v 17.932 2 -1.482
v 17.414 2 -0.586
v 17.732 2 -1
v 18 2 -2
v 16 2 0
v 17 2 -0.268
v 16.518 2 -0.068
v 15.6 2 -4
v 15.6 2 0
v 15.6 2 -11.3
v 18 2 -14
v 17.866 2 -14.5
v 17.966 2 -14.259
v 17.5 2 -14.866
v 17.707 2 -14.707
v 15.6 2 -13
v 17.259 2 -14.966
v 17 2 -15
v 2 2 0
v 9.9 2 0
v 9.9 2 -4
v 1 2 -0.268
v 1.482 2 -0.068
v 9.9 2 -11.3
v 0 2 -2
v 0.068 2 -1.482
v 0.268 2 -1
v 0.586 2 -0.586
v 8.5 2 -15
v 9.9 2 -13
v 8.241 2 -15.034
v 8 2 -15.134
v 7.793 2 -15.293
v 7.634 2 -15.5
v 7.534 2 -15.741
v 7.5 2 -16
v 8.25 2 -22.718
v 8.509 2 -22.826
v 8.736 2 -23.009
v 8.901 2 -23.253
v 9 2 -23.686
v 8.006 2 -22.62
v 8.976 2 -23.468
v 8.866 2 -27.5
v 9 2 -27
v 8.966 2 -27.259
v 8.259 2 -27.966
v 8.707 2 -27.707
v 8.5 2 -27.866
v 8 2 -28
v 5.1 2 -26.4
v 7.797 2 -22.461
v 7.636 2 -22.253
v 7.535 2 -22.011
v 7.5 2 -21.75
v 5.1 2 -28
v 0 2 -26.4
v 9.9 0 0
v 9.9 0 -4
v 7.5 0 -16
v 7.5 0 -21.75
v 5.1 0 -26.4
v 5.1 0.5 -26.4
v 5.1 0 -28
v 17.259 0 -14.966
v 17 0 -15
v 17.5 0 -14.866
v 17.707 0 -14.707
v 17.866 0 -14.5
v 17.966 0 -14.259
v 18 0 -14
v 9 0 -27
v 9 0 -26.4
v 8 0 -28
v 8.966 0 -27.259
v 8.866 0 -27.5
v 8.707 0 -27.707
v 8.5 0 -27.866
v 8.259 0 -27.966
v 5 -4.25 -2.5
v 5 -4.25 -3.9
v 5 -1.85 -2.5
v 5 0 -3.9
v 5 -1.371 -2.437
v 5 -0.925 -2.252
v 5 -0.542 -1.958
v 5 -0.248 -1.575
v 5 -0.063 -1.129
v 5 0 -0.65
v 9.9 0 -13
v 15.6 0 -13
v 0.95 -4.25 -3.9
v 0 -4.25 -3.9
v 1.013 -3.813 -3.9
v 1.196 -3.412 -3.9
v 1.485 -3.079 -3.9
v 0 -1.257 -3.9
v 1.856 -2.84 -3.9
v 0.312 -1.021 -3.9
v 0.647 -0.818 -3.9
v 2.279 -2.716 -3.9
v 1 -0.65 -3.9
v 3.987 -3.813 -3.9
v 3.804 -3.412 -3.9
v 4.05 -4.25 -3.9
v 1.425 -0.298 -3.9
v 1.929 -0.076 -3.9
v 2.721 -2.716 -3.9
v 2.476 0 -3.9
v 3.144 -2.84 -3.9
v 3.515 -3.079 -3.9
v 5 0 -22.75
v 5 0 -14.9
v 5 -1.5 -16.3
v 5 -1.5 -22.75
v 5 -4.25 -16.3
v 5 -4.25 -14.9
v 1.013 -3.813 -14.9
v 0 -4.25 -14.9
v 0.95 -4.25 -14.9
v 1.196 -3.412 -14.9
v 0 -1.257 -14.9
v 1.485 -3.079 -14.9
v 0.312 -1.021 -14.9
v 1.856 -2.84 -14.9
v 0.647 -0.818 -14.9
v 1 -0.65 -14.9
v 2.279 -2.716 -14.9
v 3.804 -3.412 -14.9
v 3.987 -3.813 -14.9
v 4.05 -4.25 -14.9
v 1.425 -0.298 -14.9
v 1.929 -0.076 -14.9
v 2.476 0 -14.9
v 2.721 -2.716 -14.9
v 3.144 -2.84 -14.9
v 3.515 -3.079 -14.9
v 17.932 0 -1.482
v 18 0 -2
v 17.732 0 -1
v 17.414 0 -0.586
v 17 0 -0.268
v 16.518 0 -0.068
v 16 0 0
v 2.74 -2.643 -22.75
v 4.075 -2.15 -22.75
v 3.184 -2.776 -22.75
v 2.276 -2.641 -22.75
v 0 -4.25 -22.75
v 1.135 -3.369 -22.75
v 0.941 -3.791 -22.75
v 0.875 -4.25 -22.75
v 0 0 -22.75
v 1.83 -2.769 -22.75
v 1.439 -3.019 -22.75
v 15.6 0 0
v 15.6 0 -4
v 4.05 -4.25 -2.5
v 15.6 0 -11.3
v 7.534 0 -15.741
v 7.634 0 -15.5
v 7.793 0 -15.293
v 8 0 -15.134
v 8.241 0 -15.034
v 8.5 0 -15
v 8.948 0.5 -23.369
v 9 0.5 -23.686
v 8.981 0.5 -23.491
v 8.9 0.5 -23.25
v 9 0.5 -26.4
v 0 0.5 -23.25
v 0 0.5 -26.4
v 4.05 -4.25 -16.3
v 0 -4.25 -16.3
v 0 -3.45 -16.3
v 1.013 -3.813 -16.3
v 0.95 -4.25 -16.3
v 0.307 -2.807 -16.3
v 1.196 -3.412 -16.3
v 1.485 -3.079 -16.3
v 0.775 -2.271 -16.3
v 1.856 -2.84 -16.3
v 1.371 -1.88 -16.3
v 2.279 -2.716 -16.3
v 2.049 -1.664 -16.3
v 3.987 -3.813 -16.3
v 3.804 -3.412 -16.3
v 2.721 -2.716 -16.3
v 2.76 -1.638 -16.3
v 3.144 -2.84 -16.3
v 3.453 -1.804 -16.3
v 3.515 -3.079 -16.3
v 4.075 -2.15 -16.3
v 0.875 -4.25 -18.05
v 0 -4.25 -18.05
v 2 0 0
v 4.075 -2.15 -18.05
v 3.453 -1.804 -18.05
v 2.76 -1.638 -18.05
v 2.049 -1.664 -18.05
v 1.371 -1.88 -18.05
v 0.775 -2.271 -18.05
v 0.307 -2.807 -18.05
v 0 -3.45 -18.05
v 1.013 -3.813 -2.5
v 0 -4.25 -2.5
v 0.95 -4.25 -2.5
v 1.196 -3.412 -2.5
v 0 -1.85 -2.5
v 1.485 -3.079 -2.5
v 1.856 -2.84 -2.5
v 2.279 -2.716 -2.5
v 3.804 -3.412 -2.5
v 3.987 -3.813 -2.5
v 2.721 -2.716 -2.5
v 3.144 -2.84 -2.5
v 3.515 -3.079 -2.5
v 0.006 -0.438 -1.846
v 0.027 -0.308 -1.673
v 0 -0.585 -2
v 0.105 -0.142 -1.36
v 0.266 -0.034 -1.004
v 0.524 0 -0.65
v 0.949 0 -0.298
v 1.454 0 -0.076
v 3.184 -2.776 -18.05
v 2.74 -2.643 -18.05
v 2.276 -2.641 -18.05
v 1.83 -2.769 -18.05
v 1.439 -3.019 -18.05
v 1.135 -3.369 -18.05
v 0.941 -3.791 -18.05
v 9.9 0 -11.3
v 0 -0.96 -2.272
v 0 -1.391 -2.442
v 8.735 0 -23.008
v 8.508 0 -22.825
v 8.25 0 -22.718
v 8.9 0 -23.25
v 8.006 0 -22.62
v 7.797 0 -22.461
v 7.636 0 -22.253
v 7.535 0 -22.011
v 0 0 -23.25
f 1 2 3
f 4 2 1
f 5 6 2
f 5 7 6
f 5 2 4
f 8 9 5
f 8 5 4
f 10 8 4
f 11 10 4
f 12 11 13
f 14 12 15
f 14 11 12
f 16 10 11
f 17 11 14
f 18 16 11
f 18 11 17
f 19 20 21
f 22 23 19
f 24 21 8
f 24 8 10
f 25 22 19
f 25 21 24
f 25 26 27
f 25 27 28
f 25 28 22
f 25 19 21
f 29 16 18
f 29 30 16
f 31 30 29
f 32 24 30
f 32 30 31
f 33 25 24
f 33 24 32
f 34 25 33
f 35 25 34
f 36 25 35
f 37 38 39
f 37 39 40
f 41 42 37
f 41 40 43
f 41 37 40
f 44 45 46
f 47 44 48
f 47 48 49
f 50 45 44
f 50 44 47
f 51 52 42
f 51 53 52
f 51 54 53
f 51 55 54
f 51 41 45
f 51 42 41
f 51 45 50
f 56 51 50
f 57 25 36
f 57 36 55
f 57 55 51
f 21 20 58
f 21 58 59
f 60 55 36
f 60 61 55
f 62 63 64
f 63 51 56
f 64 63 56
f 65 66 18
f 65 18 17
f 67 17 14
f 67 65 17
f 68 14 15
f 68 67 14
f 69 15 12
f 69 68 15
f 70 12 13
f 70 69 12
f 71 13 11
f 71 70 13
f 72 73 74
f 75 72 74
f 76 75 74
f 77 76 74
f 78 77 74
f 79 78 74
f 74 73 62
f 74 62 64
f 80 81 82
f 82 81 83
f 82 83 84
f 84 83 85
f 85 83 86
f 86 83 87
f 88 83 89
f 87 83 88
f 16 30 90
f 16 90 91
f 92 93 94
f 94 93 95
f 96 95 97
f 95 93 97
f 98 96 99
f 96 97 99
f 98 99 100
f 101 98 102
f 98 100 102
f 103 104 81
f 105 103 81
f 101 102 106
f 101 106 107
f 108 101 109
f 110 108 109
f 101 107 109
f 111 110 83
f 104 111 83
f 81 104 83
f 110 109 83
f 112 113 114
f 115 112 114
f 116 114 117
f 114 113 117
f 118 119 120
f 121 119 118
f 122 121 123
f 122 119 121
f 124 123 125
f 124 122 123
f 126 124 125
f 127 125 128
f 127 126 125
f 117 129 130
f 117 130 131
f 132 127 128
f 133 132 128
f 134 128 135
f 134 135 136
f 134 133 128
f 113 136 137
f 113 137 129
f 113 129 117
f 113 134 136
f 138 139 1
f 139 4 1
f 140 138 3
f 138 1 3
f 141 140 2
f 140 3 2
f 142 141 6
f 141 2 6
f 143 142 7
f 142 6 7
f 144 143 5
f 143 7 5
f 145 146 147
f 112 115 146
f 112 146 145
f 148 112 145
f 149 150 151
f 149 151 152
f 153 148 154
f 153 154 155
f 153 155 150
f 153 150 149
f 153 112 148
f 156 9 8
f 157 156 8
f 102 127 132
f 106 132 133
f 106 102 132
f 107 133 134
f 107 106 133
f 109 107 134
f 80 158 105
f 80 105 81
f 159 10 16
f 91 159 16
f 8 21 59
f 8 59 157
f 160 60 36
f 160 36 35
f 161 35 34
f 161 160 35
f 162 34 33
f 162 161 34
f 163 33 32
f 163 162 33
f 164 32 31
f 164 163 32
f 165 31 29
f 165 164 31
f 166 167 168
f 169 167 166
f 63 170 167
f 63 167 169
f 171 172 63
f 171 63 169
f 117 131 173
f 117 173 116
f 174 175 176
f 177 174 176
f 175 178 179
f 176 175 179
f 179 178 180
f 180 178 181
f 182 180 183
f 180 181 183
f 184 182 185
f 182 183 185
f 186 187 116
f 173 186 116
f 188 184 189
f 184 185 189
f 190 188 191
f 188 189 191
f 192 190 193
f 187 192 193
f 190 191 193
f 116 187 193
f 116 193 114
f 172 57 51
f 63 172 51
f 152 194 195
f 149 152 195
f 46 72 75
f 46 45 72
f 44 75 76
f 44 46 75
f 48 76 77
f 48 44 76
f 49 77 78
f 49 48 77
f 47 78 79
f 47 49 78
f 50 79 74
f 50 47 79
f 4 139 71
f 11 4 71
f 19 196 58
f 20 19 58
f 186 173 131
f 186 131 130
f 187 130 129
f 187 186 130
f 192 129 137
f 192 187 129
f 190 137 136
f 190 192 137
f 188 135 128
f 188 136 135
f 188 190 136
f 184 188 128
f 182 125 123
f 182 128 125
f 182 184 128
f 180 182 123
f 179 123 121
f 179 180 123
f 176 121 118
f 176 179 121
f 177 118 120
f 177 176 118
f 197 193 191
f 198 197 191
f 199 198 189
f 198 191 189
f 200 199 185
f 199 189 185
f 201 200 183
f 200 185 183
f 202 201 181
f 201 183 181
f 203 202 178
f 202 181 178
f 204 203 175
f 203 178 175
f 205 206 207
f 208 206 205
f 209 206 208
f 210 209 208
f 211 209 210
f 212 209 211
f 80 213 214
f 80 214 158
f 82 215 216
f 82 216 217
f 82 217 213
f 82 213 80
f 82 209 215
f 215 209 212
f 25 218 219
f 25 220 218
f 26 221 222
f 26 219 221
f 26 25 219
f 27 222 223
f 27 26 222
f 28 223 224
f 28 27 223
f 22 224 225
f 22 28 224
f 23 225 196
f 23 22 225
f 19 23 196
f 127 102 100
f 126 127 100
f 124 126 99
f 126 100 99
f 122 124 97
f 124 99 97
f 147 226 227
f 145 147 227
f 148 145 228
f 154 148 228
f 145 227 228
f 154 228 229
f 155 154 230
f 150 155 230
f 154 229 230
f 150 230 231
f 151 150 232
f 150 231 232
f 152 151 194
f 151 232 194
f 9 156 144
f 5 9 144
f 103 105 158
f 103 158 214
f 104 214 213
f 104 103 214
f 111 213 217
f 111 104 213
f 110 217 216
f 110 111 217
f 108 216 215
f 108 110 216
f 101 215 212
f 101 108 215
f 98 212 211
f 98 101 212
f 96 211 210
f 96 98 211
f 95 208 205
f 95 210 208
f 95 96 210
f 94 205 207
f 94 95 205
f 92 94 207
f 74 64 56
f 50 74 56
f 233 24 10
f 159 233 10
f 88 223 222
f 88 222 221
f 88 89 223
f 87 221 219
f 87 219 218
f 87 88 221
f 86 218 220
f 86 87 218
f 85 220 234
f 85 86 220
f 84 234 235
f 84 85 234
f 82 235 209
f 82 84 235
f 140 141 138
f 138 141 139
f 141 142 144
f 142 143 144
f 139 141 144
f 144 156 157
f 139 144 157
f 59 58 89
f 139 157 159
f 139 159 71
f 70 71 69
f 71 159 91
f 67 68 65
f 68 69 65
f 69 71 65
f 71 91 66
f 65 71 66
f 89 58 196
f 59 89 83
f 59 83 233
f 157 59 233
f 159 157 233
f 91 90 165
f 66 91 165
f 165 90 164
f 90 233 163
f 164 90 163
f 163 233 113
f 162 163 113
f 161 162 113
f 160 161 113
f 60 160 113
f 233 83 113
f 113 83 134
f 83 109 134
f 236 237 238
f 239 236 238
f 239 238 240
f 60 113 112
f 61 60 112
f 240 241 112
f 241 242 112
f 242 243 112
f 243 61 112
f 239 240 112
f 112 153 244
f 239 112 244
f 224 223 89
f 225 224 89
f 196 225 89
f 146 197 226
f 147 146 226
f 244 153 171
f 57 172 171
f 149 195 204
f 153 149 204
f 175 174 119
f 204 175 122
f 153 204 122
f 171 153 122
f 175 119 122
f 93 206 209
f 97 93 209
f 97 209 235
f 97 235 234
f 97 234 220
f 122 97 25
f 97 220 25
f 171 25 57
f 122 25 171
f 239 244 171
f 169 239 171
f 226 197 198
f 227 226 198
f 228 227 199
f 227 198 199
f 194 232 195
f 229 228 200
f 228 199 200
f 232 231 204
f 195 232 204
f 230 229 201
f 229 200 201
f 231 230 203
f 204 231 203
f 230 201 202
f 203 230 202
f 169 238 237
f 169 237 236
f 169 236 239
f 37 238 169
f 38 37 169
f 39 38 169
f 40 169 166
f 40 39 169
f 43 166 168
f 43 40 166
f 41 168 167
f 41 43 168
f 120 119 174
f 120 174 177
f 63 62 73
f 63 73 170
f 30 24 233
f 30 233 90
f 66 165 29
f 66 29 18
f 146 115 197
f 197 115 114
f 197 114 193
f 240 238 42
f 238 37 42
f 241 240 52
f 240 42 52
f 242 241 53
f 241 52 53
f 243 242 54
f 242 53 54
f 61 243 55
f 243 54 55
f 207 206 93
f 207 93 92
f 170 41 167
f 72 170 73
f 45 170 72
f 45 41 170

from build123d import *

# Parameters (mm, degrees)
SKETCH1_W               = 18
SKETCH1_H               = 28
BOSS_EXTRUDE1_DEPTH     = 2
SKETCH2_W               = 5
SKETCH2_H               = 1.4
BOSS_EXTRUDE2_DEPTH     = 4.25
CUT_EXTRUDE1_DEPTH      = 34.556854739
CUT_EXTRUDE1_DEPTH_BACK = 34.556854739
SKETCH4_R               = 1.55
FILLET1_R               = 2
SKETCH5_W               = 5.7
SKETCH5_H               = 1.7
SKETCH5_H_2             = 4
SKETCH5_W_2             = 5.1
SKETCH5_H_3             = 1.6
CUT_EXTRUDE2_DEPTH      = 2
CUT_EXTRUDE3_DEPTH      = 34.868311148
CUT_EXTRUDE3_DEPTH_BACK = 34.868311148
FILLET2_R               = 2
SKETCH8_W               = 5.25
SKETCH8_H               = 2
BOSS_EXTRUDE3_DEPTH     = 1.5
FILLET3_R               = 1
FILLET4_R               = 1
SKETCH7_W               = 3.15
SKETCH7_H               = 0.5
CUT_EXTRUDE4_DEPTH      = 34.556854876
BOSS_EXTRUDE4_REACH     = 32.379
BOSS_EXTRUDE6_DEPTH     = 6.45
BOSS_EXTRUDE7_START     = -4.7
BOSS_EXTRUDE7_DEPTH     = 4.7
FILLET7_R               = 2
FILLET8_R               = 1.85


with BuildPart() as part:
    # Sketch1 → Boss-Extrude1 (new body)
    with BuildSketch(Plane(origin=(0, 0, 0), x_dir=(1, 0, 0), z_dir=(0, 1, 0))):
        with Locations((9, 14)):
            Rectangle(SKETCH1_W, SKETCH1_H)
    extrude(amount=BOSS_EXTRUDE1_DEPTH)

    # Sketch2 → Boss-Extrude2 (add)
    with BuildSketch(Plane.XZ):
        with Locations((2.5, -3.2)):
            Rectangle(SKETCH2_W, SKETCH2_H)
        with Locations((2.5, -15.6)):
            Rectangle(SKETCH2_W, SKETCH2_H)
    extrude(amount=BOSS_EXTRUDE2_DEPTH)

    # Sketch4 → Cut-Extrude1 (cut, two sides: drawn at the far end of the back side and taken through both)
    with BuildSketch(Plane.XY.offset(-CUT_EXTRUDE1_DEPTH_BACK)):
        with Locations((2.5, -4.25)):
            Circle(SKETCH4_R)
    extrude(amount=CUT_EXTRUDE1_DEPTH + CUT_EXTRUDE1_DEPTH_BACK, mode=Mode.SUBTRACT)

    # Fillet1
    fillet1_edges = [part.edges().sort_by_distance(p)[0] for p in [
        (0, 1, 0),
    ]]
    fillet(fillet1_edges, radius=FILLET1_R)

    # Sketch5 → Cut-Extrude2 (cut)
    with BuildSketch(Plane(origin=(0, 2, 0), x_dir=(1, 0, 0), z_dir=(0, 1, 0))):
        with Locations((12.75, 12.15)):
            Rectangle(SKETCH5_W, SKETCH5_H)
        with Locations((12.75, 2)):
            Rectangle(SKETCH5_W, SKETCH5_H_2)
        with Locations((2.55, 27.2)):
            Rectangle(SKETCH5_W_2, SKETCH5_H_3)
    extrude(amount=-CUT_EXTRUDE2_DEPTH, mode=Mode.SUBTRACT)

    # Sketch6 → Cut-Extrude3 (cut, two sides: drawn at the far end of the back side and taken through both)
    with BuildSketch(Plane(origin=(0, 2, 0), x_dir=(1, 0, 0), z_dir=(0, 1, 0)).offset(-CUT_EXTRUDE3_DEPTH_BACK)):
        with BuildLine():
            Line((18, 14), (20.5, 14))
            Line((20.5, 14), (20.5, 30.5))
            Line((20.5, 30.5), (7.5, 30.5))
            Line((7.5, 30.5), (7.5, 28))
            Line((7.5, 28), (7.5, 16))
            ThreePointArc((7.5, 16), (7.792893219, 15.292893219), (8.5, 15))
            Line((8.5, 15), (17, 15))
            ThreePointArc((17, 15), (17.707106781, 14.707106781), (18, 14))
        make_face()
    extrude(amount=CUT_EXTRUDE3_DEPTH + CUT_EXTRUDE3_DEPTH_BACK, mode=Mode.SUBTRACT)

    # Fillet2
    fillet2_edges = [part.edges().sort_by_distance(p)[0] for p in [
        (18, 1, 0),
    ]]
    fillet(fillet2_edges, radius=FILLET2_R)

    # Sketch8 → Boss-Extrude3 (add)
    with BuildSketch(Plane(origin=(7.5, 0, 0), x_dir=(0, 0, -1), z_dir=(1, 0, 0))):
        with Locations((25.375, 1)):
            Rectangle(SKETCH8_W, SKETCH8_H)
    extrude(amount=BOSS_EXTRUDE3_DEPTH)

    # Fillet3
    fillet3_edges = [part.edges().sort_by_distance(p)[0] for p in [
        (7.5, 1, -22.75),
        (9, 1, -28),
    ]]
    fillet(fillet3_edges, radius=FILLET3_R)

    # Fillet4
    fillet4_edges = [part.edges().sort_by_distance(p)[0] for p in [
        (9, 1, -22.75),
    ]]
    fillet(fillet4_edges, radius=FILLET4_R)

    # Sketch7 → Cut-Extrude4 (cut, through all)
    with BuildSketch(Plane.ZY):
        with Locations((-24.825, 0.25)):
            Rectangle(SKETCH7_W, SKETCH7_H)
    extrude(amount=-CUT_EXTRUDE4_DEPTH, mode=Mode.SUBTRACT)

    # Sketch9 → Boss-Extrude4 (add, up to next)
    with BuildSketch(Plane(origin=(0, 0, -3.9), x_dir=(-1, 0, 0), z_dir=(0, 0, -1)), mode=Mode.PRIVATE) as boss_extrude4_sk1:
        with BuildLine():
            Line((0, 0), (-1, 0))
            Line((-1, 0), (-1, -0.65))
            ThreePointArc((-1, -0.65), (-0.477127448, -0.915635497), (0, -1.256674091))
            Line((0, -1.256674091), (0, 0))
        make_face()
    boss_extrude4_tool1 = extrude(boss_extrude4_sk1.sketch, amount=BOSS_EXTRUDE4_REACH, mode=Mode.PRIVATE) - part.part
    add(boss_extrude4_tool1.solids().sort_by_distance((0.445326, -0.476066, -3.9))[0])

    # Sketch10 → Boss-Extrude6 (add)
    with BuildSketch(Plane(origin=(0, 0, -16.3), x_dir=(-1, 0, 0), z_dir=(0, 0, -1))):
        with BuildLine():
            Line((-5, -1.5), (-4.075, -2.15))
            ThreePointArc((-4.075, -2.15), (-1.702408348, -1.749105649), (0, -3.44960947))
            Line((0, -3.44960947), (0, 0))
            Line((0, 0), (-5, 0))
            Line((-5, 0), (-5, -1.5))
        make_face()
    extrude(amount=BOSS_EXTRUDE6_DEPTH)

    # Sketch11 → Boss-Extrude7 (add)
    with BuildSketch(Plane(origin=(0, 0, -22.75), x_dir=(-1, 0, 0), z_dir=(0, 0, -1)).offset(BOSS_EXTRUDE7_START)):
        with BuildLine():
            Line((-4.075, -2.15), (-3.184119692, -2.776024))
            ThreePointArc((-3.184119692, -2.776024), (-1.625662965, -2.880270191), (-0.875, -4.25))
            Line((-0.875, -4.25), (0, -4.25))
            Line((0, -4.25), (0, -3.44960947))
            ThreePointArc((0, -3.44960947), (-1.702408348, -1.749105649), (-4.075, -2.15))
        make_face()
    extrude(amount=BOSS_EXTRUDE7_DEPTH)

    # Fillet7
    # the kernel refuses this fillet: 2 mm, written as the material it adds along each edge
    with BuildSketch(Plane(origin=(1, 0, -3.9), x_dir=(1, 0, 0), z_dir=(0, 0, -1))) as fillet7_piece_1:
        with BuildLine():
            CenterArc((1.475635456, 2), FILLET7_R, 222.454150204, 47.545849796)
            Line((0, 0.65), (0, 0))
            Line((0, 0), (1.475635456, 0))
        make_face()
    extrude(amount=14.689088641)

    # Fillet8
    fillet8_edges = [part.edges().sort_by_distance(p)[0] for p in [
        (2.5, 0, -2.5),
    ]]
    fillet(fillet8_edges, radius=FILLET8_R)


solid = part.part
